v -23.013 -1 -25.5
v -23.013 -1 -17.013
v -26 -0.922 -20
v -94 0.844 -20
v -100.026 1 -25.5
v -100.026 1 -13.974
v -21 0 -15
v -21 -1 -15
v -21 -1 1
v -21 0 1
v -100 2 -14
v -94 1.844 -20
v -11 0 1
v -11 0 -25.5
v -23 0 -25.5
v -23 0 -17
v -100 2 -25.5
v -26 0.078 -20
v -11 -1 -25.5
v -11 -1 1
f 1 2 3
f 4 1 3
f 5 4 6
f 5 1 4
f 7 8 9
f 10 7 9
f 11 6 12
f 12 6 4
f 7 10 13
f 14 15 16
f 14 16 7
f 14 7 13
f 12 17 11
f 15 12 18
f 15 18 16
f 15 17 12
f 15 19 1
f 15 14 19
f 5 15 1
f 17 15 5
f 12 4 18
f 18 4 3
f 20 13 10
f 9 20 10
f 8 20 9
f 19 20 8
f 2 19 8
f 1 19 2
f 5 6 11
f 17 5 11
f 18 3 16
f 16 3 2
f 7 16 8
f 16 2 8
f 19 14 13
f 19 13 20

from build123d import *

# Parameters (mm, degrees)
EXTRUDE018_DEPTH = 60
EXTRUDE037_DEPTH = 26.5


with BuildPart() as body014:
    # Sketch022 → Extrude018 (new body)
    with BuildSketch(Plane.XZ.offset(46)):
        Polygon((-21, 7.5), (-102, 7.5), (-102, -12), (-94, -20), (-26, -20), (-21, -15), align=None)
    extrude(amount=-EXTRUDE018_DEPTH)


with BuildPart() as cut007:
    # Sketch044 → Extrude037 (new body)
    with BuildSketch(Plane.XY.offset(-25.5)):
        Polygon((-11, -1), (-23.012985, -1), (-100.025965, 1.000337), (-100, 2), (-23, 0), (-11, 0), align=None)
    extrude(amount=EXTRUDE037_DEPTH)

    # Cut007: cut Body014
    add(body014.part, mode=Mode.SUBTRACT)


solid = cut007.part
